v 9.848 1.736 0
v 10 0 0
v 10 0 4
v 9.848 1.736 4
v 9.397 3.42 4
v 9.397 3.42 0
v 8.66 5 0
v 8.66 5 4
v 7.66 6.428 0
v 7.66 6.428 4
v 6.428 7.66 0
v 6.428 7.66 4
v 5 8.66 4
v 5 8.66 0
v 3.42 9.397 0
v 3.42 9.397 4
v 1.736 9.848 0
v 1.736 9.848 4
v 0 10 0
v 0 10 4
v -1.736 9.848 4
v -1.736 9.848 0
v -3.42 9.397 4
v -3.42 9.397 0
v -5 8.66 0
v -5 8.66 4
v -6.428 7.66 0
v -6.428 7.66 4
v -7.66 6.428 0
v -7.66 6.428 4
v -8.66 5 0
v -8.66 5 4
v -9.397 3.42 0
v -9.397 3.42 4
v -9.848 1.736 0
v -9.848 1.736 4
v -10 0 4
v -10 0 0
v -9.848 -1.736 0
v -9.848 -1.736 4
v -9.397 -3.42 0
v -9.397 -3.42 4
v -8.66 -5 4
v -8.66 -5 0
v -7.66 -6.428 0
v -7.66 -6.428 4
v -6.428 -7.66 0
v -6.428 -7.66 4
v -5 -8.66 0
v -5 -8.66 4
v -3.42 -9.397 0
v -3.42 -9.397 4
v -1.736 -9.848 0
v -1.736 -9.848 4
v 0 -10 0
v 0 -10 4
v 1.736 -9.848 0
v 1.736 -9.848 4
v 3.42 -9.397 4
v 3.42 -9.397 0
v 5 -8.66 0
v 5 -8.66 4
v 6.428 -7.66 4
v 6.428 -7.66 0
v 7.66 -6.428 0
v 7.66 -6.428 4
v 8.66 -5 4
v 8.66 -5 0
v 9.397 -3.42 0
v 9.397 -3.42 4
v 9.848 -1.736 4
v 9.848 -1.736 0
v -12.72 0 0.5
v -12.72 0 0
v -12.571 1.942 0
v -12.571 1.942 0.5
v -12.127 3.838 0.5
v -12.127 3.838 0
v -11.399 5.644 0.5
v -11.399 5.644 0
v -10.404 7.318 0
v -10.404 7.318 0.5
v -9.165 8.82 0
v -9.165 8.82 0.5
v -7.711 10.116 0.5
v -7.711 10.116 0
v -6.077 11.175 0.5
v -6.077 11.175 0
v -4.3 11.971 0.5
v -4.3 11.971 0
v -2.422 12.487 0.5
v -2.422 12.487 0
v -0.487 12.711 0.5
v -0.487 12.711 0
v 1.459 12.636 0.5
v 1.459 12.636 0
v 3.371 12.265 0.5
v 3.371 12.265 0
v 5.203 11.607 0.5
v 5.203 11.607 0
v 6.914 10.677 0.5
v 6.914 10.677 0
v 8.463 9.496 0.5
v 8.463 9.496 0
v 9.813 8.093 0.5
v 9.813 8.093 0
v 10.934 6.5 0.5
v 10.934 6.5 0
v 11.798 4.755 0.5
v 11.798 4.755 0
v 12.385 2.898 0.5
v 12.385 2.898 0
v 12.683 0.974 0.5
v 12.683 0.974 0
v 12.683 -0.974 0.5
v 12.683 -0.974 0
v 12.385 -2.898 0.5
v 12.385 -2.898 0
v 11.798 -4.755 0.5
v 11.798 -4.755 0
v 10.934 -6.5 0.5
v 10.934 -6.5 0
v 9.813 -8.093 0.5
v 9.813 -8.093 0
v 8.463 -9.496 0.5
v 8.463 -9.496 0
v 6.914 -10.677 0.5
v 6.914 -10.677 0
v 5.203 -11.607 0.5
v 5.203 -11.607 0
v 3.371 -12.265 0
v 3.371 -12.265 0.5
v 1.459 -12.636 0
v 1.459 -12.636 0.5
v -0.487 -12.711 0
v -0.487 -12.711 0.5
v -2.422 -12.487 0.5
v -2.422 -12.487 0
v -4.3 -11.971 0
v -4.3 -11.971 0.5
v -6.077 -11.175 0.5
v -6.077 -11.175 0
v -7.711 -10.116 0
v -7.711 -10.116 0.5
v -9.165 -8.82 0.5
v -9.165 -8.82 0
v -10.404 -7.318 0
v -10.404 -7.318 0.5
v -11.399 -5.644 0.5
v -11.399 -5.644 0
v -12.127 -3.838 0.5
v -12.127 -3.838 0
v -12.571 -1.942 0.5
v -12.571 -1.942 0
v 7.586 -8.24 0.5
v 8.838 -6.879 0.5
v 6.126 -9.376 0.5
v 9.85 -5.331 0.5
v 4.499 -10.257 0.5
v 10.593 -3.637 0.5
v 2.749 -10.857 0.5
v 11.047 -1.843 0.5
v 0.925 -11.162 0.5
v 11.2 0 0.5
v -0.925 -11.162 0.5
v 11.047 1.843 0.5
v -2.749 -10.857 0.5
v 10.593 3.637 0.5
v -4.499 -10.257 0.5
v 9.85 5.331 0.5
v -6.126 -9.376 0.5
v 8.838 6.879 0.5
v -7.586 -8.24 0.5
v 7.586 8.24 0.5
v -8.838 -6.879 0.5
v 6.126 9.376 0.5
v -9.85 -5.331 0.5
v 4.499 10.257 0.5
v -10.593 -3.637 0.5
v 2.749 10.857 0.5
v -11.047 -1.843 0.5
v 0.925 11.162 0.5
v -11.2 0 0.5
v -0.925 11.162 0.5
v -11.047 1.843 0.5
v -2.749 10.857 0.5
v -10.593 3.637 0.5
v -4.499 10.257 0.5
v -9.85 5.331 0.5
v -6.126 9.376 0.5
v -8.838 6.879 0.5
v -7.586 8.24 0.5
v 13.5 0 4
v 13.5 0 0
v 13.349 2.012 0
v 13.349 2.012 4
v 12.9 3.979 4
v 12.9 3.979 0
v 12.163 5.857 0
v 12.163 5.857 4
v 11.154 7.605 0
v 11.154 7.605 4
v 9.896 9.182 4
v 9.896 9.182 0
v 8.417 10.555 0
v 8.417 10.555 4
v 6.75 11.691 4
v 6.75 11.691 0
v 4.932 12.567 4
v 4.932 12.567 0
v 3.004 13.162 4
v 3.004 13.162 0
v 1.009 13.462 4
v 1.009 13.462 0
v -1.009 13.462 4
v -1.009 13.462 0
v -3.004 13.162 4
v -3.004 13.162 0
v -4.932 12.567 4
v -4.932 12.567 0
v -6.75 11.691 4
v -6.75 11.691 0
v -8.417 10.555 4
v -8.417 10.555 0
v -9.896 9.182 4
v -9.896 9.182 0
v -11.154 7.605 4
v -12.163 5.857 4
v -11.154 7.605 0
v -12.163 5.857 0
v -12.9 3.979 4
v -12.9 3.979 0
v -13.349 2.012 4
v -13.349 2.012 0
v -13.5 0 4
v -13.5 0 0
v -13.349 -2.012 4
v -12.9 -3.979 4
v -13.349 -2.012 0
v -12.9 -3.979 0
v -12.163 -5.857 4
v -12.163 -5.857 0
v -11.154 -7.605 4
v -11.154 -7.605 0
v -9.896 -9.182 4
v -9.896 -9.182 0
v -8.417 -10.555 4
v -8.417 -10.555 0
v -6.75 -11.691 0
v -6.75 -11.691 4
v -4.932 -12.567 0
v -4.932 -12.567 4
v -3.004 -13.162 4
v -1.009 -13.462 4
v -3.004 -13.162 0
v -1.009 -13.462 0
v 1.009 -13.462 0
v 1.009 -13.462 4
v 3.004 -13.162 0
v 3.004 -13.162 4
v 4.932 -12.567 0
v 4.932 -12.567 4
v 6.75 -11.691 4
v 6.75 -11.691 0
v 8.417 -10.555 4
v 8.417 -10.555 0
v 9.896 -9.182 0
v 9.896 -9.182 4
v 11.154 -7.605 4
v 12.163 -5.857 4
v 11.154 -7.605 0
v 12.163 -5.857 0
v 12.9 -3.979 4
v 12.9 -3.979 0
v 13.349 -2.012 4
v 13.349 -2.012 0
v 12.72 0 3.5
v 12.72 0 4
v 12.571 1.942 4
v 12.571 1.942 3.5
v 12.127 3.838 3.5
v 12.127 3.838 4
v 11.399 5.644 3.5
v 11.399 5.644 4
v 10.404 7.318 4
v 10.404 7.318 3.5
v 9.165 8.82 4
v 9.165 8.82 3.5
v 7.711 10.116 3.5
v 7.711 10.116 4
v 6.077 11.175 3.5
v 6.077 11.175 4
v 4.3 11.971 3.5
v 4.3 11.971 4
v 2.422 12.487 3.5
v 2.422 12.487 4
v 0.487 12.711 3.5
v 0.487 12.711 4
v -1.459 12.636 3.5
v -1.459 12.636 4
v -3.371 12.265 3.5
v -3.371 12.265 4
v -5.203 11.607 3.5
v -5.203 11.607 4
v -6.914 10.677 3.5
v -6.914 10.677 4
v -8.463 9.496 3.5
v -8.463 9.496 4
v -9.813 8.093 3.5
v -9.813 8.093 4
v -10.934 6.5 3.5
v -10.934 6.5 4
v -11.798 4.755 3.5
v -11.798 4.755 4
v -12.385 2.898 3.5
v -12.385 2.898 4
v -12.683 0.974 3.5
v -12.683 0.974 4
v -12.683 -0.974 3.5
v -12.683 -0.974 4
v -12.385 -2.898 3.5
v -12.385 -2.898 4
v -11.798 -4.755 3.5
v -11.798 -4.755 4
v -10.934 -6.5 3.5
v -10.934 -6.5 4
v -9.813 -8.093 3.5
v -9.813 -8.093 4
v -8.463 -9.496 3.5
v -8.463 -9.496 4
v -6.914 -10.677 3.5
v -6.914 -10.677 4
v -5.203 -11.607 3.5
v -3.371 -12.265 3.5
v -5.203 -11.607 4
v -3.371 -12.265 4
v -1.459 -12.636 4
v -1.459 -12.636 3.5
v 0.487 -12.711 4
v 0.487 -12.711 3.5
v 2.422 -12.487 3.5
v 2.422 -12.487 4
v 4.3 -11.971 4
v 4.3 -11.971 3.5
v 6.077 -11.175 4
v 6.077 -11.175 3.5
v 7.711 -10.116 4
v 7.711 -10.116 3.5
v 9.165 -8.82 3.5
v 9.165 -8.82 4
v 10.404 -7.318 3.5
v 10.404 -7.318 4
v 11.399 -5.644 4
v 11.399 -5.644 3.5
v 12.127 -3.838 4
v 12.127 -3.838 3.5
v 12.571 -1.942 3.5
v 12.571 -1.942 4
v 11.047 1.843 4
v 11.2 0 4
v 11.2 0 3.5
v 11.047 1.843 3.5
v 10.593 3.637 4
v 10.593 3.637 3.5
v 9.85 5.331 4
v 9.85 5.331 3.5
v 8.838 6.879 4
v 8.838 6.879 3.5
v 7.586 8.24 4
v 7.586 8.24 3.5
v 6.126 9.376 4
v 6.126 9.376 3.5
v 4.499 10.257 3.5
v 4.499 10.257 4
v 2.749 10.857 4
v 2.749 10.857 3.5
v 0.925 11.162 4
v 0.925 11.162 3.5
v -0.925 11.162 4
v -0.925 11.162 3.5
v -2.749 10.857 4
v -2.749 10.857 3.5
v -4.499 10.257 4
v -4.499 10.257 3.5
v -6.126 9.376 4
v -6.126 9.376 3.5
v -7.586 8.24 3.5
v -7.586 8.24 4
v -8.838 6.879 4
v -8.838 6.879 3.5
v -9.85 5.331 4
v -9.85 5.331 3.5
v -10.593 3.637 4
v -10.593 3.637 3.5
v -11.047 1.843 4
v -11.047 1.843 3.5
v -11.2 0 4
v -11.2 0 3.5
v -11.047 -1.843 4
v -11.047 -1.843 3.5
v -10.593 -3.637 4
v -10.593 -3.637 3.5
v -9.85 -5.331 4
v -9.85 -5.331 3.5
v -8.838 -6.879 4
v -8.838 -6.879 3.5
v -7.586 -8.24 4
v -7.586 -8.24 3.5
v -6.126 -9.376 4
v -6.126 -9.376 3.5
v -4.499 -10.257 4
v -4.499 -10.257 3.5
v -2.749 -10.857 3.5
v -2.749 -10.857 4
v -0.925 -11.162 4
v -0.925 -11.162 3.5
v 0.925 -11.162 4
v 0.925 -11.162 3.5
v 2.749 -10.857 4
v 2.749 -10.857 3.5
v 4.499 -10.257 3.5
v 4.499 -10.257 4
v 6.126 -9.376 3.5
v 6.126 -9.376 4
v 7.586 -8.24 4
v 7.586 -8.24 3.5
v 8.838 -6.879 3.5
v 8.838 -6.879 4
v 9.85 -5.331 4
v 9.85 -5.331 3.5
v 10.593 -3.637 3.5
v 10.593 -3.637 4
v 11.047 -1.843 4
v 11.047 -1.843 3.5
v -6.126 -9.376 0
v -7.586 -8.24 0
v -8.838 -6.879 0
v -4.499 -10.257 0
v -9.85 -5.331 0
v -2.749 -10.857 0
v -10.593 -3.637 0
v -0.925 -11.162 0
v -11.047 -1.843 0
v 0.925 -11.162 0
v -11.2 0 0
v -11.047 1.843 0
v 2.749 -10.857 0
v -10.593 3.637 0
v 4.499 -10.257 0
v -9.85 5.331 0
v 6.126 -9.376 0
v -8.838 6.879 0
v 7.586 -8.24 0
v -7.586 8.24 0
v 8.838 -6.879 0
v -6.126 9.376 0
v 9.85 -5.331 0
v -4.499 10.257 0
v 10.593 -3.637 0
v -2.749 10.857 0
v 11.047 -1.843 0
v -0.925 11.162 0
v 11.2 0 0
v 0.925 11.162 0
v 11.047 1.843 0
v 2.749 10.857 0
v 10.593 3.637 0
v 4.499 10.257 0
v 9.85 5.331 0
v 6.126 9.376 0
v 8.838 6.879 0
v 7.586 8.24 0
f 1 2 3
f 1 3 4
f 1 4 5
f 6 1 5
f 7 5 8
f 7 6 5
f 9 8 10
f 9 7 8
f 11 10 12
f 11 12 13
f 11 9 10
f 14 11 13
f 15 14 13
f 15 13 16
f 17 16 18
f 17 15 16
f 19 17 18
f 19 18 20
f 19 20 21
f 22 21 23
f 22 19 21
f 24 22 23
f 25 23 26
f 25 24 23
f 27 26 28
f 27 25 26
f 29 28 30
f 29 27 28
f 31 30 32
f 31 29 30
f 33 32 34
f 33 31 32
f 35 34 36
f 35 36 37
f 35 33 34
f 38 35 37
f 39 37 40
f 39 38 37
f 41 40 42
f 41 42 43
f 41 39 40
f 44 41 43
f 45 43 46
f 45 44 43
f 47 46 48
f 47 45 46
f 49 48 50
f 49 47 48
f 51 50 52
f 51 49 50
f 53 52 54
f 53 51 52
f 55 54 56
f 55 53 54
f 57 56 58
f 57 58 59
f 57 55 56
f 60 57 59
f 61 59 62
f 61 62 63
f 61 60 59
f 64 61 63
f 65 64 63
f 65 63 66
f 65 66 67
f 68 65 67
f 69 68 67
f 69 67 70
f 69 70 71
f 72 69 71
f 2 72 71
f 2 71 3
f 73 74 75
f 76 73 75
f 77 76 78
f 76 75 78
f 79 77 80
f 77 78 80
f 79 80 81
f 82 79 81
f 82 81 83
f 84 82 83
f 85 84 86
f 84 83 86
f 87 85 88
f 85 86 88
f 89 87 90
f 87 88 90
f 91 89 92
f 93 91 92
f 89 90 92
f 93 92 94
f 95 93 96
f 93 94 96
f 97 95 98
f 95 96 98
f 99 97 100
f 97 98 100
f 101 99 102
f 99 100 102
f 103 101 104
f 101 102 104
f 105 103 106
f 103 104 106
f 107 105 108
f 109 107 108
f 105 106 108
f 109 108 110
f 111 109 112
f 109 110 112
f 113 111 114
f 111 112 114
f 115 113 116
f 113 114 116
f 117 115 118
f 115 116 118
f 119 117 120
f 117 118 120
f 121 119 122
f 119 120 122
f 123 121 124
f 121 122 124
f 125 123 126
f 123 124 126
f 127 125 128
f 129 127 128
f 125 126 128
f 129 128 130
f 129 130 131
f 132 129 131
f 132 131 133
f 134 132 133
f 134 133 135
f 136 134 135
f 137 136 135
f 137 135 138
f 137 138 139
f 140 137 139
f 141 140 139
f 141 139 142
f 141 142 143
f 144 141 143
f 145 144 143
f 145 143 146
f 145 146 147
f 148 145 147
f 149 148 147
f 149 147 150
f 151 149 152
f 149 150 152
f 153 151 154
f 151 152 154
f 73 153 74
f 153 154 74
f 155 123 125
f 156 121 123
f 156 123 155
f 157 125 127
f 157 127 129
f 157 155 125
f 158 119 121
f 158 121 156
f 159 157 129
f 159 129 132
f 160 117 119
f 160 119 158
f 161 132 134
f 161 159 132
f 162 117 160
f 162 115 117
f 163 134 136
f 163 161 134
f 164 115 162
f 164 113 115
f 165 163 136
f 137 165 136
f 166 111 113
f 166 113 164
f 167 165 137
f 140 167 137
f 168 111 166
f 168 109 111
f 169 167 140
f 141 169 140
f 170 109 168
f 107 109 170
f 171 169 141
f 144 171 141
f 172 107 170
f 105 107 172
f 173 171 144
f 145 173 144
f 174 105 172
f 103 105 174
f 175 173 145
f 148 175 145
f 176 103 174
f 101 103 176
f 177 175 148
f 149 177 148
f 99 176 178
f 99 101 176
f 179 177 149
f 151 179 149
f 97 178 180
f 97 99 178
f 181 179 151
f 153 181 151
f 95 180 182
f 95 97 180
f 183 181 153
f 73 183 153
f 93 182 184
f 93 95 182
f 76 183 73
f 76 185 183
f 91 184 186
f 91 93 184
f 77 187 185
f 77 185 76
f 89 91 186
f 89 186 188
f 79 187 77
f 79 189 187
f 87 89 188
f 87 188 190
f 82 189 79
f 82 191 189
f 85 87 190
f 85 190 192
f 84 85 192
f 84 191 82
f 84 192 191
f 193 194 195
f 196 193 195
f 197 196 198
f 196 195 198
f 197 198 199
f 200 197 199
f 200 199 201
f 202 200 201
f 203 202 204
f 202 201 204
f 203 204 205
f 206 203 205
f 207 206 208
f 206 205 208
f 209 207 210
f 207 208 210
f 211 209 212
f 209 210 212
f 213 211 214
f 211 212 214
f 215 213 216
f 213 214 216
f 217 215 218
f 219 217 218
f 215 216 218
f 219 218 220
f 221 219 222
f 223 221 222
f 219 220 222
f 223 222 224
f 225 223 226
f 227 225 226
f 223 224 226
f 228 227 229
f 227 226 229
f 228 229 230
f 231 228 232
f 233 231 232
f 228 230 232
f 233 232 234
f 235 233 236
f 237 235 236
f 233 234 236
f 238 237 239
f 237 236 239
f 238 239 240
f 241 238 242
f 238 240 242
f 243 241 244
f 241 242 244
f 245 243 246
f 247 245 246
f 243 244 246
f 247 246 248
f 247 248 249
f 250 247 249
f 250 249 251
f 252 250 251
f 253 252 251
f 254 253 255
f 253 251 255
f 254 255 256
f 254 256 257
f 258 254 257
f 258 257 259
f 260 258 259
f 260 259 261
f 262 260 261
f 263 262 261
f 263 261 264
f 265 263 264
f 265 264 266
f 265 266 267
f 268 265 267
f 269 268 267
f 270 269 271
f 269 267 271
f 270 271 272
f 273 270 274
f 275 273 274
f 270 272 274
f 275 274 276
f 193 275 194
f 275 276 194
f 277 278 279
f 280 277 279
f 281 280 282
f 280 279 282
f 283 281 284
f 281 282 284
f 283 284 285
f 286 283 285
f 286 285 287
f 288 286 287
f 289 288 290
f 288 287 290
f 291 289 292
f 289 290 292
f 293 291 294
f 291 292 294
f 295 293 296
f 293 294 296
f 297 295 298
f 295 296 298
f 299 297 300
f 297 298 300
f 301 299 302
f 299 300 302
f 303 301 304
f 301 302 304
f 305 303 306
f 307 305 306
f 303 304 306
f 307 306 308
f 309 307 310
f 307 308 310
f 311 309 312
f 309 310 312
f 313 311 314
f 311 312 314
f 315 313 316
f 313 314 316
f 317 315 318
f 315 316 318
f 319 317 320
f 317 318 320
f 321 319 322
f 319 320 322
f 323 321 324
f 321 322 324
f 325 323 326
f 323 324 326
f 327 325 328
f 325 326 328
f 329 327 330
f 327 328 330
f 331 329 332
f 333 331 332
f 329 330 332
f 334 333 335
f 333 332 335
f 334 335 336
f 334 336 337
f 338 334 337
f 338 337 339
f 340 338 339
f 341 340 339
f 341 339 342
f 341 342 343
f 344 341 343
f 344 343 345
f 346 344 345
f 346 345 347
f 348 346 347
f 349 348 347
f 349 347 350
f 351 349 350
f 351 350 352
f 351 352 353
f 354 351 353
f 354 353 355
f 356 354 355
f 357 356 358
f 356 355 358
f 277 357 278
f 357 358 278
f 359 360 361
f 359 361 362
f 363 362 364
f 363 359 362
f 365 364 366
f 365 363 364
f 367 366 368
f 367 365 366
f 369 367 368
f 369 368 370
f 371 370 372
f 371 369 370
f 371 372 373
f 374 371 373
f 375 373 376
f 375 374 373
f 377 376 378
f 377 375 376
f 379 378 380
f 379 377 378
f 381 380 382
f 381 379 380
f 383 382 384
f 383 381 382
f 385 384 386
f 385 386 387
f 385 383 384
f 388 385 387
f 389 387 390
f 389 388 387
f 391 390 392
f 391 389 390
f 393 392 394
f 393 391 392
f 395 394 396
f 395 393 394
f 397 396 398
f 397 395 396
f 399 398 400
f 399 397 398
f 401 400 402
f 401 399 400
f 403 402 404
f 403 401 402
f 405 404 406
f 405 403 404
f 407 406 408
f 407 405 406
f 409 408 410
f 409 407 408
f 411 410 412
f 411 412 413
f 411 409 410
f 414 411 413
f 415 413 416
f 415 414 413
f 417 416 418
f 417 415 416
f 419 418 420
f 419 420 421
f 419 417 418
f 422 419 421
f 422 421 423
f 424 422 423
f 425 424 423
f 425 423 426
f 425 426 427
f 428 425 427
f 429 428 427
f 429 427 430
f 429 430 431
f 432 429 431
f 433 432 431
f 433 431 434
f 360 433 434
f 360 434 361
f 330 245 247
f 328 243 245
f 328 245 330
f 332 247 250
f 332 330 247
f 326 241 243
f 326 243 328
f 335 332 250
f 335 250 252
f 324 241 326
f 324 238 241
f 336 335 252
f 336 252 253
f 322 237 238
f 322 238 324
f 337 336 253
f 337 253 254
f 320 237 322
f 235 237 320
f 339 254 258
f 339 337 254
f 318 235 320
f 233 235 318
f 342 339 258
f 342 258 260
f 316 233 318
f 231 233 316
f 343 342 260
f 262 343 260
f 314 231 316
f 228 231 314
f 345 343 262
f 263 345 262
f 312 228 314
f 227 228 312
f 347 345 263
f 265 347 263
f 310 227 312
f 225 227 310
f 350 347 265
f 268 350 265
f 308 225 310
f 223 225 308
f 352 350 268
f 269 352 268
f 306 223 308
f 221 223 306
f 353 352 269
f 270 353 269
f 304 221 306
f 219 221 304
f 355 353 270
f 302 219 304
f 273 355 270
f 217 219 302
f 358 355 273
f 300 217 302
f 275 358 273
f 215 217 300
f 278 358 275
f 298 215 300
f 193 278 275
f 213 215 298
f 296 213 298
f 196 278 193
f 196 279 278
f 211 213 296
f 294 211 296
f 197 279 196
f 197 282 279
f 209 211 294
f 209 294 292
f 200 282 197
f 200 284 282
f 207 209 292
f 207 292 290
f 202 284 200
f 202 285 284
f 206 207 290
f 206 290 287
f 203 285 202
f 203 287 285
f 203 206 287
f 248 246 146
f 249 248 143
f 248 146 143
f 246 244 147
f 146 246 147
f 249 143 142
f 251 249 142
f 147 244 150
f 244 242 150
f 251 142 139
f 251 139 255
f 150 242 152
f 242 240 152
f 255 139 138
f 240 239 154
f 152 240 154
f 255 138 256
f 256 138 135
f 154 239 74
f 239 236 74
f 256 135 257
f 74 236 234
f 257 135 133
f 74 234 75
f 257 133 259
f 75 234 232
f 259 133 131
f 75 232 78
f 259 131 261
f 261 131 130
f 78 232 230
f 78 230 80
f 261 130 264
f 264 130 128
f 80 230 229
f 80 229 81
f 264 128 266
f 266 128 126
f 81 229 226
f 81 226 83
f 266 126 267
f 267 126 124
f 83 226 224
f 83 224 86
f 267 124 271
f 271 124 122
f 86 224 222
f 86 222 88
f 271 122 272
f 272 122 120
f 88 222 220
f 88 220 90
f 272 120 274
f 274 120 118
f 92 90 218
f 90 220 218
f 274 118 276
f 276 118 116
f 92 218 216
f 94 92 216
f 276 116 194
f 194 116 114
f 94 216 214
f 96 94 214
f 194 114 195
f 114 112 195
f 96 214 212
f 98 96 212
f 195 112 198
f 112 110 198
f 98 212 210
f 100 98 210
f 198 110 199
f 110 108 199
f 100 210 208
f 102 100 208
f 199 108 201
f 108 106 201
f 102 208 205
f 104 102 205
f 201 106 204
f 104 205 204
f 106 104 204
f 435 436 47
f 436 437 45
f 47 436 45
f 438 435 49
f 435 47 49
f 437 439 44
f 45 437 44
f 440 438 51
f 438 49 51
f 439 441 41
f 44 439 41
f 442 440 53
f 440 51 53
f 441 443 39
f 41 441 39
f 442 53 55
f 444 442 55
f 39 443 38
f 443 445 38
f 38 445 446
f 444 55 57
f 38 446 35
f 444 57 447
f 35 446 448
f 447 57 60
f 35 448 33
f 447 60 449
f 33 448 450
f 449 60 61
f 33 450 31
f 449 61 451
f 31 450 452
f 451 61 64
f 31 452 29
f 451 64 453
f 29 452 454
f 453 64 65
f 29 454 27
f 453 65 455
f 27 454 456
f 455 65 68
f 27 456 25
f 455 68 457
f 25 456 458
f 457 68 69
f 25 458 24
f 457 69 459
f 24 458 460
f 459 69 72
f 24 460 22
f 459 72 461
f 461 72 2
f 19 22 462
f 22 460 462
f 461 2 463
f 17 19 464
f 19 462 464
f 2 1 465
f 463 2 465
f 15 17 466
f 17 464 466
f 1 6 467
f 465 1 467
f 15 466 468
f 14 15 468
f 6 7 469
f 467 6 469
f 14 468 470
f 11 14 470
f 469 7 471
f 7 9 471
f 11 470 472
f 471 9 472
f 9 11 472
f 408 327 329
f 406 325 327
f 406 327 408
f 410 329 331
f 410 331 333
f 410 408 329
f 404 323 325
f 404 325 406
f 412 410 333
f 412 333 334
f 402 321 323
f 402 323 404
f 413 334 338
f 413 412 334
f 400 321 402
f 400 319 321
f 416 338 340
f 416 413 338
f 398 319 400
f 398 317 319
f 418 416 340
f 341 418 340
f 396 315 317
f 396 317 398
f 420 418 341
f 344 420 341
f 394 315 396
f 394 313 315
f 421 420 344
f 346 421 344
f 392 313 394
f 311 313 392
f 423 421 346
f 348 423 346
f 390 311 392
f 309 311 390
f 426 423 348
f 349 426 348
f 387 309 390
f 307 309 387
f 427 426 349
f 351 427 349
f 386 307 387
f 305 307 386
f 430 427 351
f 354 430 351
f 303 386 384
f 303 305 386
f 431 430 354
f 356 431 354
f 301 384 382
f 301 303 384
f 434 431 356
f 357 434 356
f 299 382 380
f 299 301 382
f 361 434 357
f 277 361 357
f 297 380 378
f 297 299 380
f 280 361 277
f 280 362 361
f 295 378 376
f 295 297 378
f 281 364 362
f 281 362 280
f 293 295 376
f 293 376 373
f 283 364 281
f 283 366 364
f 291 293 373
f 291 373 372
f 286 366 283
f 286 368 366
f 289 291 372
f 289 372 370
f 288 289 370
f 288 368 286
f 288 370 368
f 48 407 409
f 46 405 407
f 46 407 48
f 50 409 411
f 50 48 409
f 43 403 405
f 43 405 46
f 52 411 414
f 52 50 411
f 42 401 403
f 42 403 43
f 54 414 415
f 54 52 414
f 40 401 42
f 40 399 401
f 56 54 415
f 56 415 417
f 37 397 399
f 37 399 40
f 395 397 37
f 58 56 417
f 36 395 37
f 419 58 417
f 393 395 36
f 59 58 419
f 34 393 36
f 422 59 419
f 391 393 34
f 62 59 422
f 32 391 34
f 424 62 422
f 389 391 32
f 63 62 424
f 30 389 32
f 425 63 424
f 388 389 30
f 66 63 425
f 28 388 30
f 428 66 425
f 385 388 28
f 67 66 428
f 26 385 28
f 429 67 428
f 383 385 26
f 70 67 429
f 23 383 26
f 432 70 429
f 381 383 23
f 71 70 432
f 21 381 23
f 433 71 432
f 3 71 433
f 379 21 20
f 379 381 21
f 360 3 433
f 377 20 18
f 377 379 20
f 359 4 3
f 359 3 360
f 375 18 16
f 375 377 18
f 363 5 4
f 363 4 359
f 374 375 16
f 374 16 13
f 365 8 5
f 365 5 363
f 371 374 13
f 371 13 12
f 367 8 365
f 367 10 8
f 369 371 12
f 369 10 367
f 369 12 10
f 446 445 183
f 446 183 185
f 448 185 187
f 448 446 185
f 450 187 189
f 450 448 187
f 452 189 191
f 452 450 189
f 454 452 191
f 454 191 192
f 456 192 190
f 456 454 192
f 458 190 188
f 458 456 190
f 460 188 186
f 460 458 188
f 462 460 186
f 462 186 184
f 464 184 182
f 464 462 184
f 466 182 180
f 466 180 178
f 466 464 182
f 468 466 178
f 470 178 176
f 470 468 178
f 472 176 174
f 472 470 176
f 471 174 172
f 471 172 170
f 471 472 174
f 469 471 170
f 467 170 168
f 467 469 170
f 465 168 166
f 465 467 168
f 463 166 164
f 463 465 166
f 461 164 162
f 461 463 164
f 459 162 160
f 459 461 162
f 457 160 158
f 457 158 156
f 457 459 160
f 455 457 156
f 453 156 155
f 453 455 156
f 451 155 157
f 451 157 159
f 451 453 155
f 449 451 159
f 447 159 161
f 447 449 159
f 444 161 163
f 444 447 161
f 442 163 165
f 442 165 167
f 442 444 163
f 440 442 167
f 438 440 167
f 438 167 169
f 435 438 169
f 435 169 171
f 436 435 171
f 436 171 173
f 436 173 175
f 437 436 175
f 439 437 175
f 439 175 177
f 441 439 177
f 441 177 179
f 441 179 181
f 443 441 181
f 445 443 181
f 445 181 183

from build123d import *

# Parameters (mm, degrees)
SKETCH_1_R          = 13.5
SKETCH_1_R_2        = 10
EXTRUDE_1_DEPTH     = 4
SKETCH_2_R          = 12.72
SKETCH_2_R_2        = 11.2
CUT_EXTRUDE_1_DEPTH = 0.5
SKETCH_3_R          = 12.72
SKETCH_3_R_2        = 11.2
CUT_EXTRUDE_2_DEPTH = 0.5


with BuildPart() as part:
    # 草圖1 → 填料-伸長1 (new body)
    with BuildSketch(Plane.XY):
        Circle(SKETCH_1_R)
        Circle(SKETCH_1_R_2, mode=Mode.SUBTRACT)
    extrude(amount=EXTRUDE_1_DEPTH)

    # 草圖2 → 除料-伸長1 (cut)
    with BuildSketch(Plane.XY.offset(4)):
        Circle(SKETCH_2_R)
        Circle(SKETCH_2_R_2, mode=Mode.SUBTRACT)
    extrude(amount=-CUT_EXTRUDE_1_DEPTH, mode=Mode.SUBTRACT)

    # 草圖3 → 除料-伸長2 (cut)
    with BuildSketch(Plane(origin=(0, 0, 0), x_dir=(-1, 0, 0), z_dir=(0, 0, -1))):
        Circle(SKETCH_3_R)
        Circle(SKETCH_3_R_2, mode=Mode.SUBTRACT)
    extrude(amount=-CUT_EXTRUDE_2_DEPTH, mode=Mode.SUBTRACT)


solid = part.part
